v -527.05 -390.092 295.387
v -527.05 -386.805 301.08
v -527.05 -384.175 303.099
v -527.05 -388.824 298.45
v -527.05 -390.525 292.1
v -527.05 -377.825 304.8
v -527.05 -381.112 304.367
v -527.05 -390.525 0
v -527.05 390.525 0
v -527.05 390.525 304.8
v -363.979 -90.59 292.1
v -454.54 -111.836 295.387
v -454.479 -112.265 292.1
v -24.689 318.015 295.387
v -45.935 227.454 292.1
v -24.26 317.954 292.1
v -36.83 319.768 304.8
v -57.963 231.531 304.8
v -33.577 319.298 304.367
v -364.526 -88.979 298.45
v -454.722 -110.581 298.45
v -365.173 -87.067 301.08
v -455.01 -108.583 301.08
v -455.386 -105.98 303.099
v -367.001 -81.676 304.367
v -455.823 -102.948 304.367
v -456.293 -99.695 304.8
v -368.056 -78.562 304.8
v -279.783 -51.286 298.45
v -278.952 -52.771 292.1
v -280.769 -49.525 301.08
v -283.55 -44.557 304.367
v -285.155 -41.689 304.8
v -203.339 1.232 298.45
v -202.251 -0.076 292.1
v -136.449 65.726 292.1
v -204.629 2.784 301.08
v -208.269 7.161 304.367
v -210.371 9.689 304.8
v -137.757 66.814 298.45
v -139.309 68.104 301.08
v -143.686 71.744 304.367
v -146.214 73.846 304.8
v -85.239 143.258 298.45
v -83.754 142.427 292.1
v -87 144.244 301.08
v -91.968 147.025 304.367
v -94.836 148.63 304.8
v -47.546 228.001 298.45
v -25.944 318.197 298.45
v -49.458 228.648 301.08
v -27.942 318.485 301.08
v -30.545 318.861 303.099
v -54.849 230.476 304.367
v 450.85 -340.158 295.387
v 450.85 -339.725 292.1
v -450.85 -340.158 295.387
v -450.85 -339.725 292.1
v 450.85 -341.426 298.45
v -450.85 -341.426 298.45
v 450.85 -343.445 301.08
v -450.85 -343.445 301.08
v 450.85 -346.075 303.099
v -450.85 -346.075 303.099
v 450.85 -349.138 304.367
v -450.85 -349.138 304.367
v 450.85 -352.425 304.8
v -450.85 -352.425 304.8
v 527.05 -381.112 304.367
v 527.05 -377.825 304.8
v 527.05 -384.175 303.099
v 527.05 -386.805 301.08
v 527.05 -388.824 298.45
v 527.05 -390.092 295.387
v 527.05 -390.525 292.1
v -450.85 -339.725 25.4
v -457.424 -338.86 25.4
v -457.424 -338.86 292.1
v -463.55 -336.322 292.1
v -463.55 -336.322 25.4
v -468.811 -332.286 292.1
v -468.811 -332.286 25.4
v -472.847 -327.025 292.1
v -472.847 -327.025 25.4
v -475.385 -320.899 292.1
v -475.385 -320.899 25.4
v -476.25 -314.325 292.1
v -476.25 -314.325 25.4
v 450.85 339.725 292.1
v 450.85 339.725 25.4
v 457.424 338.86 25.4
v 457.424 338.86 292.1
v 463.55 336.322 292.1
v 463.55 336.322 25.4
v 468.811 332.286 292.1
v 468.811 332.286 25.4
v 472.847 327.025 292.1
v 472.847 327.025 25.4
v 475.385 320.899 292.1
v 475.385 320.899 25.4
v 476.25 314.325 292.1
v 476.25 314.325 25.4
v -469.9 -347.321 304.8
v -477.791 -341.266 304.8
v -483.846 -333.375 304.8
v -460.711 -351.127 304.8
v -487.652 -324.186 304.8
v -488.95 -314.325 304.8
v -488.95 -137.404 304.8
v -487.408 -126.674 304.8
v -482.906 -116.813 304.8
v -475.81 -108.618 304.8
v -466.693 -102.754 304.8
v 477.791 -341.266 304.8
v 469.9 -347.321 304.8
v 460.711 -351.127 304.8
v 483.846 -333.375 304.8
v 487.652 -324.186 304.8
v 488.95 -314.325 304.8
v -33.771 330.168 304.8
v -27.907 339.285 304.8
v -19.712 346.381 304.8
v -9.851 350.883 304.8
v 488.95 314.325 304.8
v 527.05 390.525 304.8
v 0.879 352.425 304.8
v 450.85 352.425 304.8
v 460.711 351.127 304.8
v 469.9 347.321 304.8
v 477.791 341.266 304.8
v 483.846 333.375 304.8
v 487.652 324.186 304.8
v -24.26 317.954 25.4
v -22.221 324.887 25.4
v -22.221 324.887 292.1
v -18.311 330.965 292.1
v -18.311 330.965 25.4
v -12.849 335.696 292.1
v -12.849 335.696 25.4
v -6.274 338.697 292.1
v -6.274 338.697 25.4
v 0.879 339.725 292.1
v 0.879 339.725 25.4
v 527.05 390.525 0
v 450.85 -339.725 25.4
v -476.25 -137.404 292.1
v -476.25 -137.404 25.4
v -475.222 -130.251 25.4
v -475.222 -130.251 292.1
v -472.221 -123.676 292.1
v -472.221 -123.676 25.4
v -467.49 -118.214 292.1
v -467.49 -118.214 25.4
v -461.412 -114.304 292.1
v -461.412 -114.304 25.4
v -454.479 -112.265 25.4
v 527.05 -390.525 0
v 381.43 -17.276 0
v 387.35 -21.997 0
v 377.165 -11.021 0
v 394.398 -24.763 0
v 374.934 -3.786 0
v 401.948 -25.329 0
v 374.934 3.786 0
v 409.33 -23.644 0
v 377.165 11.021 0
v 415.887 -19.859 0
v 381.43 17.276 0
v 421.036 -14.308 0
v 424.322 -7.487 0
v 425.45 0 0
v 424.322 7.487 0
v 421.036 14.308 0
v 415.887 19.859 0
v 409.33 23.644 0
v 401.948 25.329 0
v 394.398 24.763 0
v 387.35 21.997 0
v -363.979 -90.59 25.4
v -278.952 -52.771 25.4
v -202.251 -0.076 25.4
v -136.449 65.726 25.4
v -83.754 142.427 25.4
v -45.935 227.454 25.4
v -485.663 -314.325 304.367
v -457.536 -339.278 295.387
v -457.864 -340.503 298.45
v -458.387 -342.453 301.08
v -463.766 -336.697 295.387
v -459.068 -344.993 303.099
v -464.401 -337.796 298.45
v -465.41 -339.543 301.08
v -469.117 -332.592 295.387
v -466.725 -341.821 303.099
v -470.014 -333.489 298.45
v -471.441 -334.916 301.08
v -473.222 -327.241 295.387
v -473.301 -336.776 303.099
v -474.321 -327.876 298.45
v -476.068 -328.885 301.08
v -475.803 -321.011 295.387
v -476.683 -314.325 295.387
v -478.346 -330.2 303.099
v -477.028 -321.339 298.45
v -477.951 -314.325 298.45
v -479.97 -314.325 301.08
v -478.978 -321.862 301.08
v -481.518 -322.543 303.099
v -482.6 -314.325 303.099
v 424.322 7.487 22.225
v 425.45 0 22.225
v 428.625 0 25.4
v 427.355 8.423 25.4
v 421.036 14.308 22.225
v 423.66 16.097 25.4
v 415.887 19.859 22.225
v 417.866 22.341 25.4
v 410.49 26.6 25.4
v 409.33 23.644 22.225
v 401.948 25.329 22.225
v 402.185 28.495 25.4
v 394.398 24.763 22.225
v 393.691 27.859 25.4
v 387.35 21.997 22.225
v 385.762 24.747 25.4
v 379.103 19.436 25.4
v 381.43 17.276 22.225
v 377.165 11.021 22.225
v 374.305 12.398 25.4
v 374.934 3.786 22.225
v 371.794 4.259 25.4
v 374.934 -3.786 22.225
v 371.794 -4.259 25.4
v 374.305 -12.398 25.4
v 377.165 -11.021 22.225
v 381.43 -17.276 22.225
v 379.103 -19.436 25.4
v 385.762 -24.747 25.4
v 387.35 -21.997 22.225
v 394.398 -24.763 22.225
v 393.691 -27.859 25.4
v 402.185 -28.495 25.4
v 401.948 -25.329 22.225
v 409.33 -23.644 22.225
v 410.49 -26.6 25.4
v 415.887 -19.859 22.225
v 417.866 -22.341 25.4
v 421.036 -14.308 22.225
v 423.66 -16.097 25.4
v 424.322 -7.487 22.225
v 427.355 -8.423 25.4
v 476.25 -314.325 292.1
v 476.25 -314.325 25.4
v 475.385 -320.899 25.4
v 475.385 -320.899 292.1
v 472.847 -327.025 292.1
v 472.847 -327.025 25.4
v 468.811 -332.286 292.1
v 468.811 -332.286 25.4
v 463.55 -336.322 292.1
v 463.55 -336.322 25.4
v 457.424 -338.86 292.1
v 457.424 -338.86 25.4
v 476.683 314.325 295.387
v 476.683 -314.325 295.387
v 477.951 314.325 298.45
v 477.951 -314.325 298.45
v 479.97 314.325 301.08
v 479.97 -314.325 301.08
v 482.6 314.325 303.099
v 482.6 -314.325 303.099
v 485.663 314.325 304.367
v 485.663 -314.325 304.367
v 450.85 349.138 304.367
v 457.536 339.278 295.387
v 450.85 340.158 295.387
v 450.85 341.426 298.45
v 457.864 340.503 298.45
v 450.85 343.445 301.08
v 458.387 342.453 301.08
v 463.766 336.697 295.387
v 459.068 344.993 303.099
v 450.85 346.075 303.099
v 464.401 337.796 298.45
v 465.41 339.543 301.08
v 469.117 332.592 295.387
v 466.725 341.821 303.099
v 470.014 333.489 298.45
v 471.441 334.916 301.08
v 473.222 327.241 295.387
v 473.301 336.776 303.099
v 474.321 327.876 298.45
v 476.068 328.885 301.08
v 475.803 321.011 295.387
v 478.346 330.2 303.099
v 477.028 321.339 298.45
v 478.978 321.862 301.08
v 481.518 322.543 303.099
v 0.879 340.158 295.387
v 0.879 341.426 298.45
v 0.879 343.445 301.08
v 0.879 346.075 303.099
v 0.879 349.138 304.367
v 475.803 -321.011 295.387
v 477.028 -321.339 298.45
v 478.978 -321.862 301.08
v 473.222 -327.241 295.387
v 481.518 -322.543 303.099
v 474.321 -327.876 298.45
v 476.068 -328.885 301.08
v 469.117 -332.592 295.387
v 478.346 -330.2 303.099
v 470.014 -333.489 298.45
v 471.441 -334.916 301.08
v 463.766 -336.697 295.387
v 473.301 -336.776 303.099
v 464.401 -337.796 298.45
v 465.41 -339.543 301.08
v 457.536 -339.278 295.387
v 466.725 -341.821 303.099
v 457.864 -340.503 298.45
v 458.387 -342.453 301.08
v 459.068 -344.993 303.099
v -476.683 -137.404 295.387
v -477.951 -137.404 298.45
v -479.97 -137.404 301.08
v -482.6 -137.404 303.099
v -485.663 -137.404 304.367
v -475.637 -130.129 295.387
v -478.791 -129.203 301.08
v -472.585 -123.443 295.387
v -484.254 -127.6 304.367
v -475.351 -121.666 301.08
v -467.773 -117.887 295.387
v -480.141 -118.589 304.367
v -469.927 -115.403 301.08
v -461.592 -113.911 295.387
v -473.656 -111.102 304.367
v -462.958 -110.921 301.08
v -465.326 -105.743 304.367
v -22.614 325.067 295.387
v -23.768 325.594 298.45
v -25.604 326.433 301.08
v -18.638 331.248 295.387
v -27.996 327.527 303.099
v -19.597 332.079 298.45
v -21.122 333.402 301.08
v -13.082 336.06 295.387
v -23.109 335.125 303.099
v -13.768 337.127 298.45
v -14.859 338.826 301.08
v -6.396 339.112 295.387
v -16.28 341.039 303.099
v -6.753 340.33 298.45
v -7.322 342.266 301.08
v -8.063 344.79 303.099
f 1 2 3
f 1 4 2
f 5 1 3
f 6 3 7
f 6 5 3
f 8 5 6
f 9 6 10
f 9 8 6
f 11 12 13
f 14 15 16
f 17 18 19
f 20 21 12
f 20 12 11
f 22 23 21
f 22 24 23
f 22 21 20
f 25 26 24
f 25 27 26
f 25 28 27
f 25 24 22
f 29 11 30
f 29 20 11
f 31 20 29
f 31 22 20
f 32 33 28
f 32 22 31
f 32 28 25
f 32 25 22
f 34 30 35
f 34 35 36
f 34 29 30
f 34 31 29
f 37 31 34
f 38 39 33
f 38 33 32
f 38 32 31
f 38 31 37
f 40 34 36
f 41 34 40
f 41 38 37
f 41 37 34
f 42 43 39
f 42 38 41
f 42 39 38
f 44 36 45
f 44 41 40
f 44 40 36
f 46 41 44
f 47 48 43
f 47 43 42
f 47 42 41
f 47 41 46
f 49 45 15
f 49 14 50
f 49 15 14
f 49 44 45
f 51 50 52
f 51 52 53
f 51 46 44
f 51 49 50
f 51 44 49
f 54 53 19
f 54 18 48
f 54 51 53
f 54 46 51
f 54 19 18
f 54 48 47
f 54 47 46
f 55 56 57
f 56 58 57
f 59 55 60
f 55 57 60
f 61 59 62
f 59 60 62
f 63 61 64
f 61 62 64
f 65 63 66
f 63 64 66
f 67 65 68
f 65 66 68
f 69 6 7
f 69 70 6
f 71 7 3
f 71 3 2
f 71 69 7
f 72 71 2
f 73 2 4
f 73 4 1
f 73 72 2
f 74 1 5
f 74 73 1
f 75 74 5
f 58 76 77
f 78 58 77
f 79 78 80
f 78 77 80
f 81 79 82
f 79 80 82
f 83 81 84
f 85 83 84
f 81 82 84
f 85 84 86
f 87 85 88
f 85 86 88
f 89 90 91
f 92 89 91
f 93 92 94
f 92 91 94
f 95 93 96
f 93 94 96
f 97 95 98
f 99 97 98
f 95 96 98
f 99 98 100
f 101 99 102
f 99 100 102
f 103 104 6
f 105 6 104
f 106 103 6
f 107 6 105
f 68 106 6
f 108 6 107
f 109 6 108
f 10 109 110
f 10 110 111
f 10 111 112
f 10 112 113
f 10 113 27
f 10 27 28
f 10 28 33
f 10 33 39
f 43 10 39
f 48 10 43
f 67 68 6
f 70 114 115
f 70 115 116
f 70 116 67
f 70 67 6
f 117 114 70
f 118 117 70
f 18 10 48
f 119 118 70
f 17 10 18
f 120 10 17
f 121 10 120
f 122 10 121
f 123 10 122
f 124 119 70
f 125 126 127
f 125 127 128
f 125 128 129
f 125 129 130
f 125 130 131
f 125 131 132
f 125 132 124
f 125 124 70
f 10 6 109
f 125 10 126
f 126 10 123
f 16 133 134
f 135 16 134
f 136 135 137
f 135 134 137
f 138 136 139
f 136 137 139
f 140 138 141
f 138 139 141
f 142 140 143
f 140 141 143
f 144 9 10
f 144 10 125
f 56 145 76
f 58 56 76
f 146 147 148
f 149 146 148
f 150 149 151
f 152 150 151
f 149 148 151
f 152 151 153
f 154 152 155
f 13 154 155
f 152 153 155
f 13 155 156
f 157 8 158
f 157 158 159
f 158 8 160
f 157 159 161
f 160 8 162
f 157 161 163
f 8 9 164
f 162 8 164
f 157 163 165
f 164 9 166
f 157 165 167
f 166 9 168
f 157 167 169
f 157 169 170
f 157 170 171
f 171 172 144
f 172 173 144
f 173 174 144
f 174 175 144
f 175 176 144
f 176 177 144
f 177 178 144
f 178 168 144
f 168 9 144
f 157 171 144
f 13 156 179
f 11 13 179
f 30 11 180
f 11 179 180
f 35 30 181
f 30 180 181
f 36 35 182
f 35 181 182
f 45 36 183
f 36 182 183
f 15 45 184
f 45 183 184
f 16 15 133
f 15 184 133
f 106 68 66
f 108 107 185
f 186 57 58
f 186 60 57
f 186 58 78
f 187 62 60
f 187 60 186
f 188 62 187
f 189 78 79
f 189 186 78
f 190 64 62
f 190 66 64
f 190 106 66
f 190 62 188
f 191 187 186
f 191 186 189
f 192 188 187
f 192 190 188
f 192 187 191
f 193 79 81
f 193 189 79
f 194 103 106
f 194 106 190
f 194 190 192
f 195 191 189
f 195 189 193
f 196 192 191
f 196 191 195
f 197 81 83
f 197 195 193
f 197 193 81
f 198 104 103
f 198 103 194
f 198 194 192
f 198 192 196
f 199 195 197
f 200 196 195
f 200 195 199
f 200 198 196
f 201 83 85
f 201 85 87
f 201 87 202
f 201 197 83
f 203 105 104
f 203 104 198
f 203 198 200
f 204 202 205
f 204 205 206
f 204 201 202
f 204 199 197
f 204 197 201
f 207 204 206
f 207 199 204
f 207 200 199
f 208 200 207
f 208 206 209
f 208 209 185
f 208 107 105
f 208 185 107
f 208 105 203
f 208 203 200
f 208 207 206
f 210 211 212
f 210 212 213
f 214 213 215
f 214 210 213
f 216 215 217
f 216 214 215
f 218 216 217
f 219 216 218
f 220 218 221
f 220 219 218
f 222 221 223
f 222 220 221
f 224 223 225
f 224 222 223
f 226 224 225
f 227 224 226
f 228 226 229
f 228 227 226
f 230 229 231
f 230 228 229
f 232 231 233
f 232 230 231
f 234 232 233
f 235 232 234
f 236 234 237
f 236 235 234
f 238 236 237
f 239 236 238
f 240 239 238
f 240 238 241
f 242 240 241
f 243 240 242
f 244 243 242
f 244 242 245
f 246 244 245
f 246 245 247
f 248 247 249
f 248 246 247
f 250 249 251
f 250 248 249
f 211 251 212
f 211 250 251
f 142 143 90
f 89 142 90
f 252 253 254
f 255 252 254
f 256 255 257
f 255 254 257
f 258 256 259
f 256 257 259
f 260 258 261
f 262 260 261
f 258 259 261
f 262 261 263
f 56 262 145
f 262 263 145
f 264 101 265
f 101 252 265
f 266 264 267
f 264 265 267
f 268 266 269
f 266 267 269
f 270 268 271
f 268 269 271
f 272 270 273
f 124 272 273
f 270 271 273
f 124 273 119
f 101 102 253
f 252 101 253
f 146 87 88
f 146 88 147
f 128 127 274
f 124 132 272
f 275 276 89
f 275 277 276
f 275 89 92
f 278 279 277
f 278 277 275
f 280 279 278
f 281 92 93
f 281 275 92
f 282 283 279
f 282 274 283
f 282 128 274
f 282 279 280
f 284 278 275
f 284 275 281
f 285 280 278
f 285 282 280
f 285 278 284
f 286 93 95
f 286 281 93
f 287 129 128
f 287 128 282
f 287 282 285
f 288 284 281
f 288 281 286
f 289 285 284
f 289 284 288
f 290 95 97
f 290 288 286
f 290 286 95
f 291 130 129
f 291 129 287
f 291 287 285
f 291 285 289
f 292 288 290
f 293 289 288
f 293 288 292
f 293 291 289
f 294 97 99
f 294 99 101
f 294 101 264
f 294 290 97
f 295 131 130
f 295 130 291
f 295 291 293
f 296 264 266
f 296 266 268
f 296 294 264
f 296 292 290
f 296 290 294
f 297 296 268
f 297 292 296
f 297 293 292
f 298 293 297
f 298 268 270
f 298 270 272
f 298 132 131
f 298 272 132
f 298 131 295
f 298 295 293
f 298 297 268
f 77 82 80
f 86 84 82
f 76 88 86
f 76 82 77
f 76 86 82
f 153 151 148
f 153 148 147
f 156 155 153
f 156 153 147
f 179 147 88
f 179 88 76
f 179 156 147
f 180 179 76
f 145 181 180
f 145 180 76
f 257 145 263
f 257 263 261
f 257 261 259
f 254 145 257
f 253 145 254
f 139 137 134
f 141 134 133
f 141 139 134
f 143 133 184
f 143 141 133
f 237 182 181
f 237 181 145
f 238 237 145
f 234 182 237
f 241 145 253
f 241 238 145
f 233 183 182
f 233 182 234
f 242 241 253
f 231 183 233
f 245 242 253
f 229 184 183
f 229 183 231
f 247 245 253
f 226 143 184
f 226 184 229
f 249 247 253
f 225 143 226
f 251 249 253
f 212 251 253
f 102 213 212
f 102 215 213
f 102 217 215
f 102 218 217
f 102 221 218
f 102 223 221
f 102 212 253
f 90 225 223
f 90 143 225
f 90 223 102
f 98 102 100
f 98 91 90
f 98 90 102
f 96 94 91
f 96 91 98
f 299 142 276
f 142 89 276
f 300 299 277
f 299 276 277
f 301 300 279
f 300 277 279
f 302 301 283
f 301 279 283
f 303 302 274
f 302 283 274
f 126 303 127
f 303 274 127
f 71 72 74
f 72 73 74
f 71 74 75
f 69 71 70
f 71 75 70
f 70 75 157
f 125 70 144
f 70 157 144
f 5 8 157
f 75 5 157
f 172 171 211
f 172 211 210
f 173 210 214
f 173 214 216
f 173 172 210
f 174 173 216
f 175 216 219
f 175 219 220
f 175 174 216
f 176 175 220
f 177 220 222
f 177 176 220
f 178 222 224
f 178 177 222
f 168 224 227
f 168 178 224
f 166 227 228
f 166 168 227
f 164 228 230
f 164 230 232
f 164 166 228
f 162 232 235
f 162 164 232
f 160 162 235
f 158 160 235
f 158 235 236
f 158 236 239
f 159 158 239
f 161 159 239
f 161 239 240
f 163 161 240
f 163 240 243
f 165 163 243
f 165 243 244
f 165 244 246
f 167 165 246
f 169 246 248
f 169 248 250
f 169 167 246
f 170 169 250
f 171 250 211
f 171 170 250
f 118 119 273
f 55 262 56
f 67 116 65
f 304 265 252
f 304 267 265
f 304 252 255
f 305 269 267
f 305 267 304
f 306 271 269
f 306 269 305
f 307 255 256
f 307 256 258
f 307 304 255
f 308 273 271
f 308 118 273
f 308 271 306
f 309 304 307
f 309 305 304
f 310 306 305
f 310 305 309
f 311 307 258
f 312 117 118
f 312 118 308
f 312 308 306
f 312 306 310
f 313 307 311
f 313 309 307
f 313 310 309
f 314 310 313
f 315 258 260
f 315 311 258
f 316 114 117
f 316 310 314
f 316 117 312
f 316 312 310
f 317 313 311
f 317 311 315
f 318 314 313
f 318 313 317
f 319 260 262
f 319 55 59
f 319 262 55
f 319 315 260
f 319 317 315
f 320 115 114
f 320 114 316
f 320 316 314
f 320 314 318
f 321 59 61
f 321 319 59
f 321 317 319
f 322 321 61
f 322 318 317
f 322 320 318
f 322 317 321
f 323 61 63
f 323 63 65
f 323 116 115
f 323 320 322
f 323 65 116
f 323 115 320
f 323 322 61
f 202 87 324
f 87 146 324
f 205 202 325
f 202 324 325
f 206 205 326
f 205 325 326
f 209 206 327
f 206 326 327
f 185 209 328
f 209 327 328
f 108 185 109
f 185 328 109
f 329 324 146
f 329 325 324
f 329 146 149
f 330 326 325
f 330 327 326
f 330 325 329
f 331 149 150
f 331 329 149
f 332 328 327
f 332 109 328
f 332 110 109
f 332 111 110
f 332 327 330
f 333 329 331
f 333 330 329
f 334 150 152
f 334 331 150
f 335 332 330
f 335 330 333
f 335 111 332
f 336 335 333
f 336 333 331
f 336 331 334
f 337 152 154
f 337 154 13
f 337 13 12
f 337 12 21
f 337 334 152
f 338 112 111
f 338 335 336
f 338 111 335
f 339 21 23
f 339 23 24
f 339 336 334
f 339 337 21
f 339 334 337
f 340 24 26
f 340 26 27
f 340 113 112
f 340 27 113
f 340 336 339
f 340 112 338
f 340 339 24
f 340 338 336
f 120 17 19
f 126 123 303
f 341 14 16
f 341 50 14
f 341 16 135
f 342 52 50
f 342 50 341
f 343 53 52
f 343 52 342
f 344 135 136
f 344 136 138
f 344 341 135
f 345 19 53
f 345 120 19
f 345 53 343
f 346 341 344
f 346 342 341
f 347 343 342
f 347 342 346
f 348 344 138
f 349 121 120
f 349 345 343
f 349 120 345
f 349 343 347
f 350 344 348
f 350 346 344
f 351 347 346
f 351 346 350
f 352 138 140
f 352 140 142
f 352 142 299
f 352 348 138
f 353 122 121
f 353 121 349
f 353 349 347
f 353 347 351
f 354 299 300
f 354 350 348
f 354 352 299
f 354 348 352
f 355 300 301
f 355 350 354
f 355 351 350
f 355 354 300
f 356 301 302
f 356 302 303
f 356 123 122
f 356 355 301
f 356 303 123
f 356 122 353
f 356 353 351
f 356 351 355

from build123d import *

# Parameters (mm, degrees)
F0_W     = 1054.1
F0_H     = 781.05
F1_DEPTH = 304.8
F0_R     = 25.4
F2_DEPTH = 25.4
F3_R     = 12.7
F4_SIZE  = 3.175
F5_R     = 12.7


with BuildPart() as f1:
    # F0 (on Top) → F1 (new body)
    with BuildSketch(Plane.XY):
        Rectangle(F0_W, F0_H)
        with BuildLine():
            ThreePointArc((-24.260394, 317.953571), (-15.749117, 333.525595), (0.879086, 339.725))
            Line((0.879086, 339.725), (450.85, 339.725))
            ThreePointArc((450.85, 339.725), (468.810512, 332.285512), (476.25, 314.325))
            Line((476.25, 314.325), (476.25, -314.325))
            ThreePointArc((476.25, -314.325), (468.810512, -332.285512), (450.85, -339.725))
            Line((450.85, -339.725), (-450.85, -339.725))
            ThreePointArc((-450.85, -339.725), (-468.810512, -332.285512), (-476.25, -314.325))
            Line((-476.25, -314.325), (-476.25, -137.404086))
            ThreePointArc((-476.25, -137.404086), (-470.050595, -120.775883), (-454.478571, -112.264606))
            ThreePointArc((-454.478571, -112.264606), (-167.839755, 31.314755), (-24.260394, 317.953571))
        make_face(mode=Mode.SUBTRACT)
    extrude(amount=F1_DEPTH)

    # F0 (on Top) → F2 (join)
    with BuildSketch(Plane.XY):
        with BuildLine():
            Line((450.85, 339.725), (0.879086, 339.725))
            ThreePointArc((0.879086, 339.725), (-15.749117, 333.525595), (-24.260394, 317.953571))
            ThreePointArc((-24.260394, 317.953571), (-167.839755, 31.314755), (-454.478571, -112.264606))
            ThreePointArc((-454.478571, -112.264606), (-470.050595, -120.775883), (-476.25, -137.404086))
            Line((-476.25, -137.404086), (-476.25, -314.325))
            ThreePointArc((-476.25, -314.325), (-468.810512, -332.285512), (-450.85, -339.725))
            Line((-450.85, -339.725), (450.85, -339.725))
            ThreePointArc((450.85, -339.725), (468.810512, -332.285512), (476.25, -314.325))
            Line((476.25, -314.325), (476.25, 314.325))
            ThreePointArc((476.25, 314.325), (468.810512, 332.285512), (450.85, 339.725))
        make_face()
        with Locations((400.05, 0)):
            Circle(F0_R, mode=Mode.SUBTRACT)
    extrude(amount=F2_DEPTH)

    # F3
    f3_edges = [f1.edges().sort_by_distance(p)[0] for p in [
        (-167.839755, 31.314755, 304.8),
    ]]
    fillet(f3_edges, radius=F3_R)

    # F4
    f4_edges = [f1.edges().sort_by_distance(p)[0] for p in [
        (374.65, 0, 25.4),
    ]]
    chamfer(f4_edges, length=F4_SIZE)

    # F5
    f5_edges = [f1.edges().sort_by_distance(p)[0] for p in [
        (0, -390.525, 304.8),
    ]]
    fillet(f5_edges, radius=F5_R)


solid = f1.part
